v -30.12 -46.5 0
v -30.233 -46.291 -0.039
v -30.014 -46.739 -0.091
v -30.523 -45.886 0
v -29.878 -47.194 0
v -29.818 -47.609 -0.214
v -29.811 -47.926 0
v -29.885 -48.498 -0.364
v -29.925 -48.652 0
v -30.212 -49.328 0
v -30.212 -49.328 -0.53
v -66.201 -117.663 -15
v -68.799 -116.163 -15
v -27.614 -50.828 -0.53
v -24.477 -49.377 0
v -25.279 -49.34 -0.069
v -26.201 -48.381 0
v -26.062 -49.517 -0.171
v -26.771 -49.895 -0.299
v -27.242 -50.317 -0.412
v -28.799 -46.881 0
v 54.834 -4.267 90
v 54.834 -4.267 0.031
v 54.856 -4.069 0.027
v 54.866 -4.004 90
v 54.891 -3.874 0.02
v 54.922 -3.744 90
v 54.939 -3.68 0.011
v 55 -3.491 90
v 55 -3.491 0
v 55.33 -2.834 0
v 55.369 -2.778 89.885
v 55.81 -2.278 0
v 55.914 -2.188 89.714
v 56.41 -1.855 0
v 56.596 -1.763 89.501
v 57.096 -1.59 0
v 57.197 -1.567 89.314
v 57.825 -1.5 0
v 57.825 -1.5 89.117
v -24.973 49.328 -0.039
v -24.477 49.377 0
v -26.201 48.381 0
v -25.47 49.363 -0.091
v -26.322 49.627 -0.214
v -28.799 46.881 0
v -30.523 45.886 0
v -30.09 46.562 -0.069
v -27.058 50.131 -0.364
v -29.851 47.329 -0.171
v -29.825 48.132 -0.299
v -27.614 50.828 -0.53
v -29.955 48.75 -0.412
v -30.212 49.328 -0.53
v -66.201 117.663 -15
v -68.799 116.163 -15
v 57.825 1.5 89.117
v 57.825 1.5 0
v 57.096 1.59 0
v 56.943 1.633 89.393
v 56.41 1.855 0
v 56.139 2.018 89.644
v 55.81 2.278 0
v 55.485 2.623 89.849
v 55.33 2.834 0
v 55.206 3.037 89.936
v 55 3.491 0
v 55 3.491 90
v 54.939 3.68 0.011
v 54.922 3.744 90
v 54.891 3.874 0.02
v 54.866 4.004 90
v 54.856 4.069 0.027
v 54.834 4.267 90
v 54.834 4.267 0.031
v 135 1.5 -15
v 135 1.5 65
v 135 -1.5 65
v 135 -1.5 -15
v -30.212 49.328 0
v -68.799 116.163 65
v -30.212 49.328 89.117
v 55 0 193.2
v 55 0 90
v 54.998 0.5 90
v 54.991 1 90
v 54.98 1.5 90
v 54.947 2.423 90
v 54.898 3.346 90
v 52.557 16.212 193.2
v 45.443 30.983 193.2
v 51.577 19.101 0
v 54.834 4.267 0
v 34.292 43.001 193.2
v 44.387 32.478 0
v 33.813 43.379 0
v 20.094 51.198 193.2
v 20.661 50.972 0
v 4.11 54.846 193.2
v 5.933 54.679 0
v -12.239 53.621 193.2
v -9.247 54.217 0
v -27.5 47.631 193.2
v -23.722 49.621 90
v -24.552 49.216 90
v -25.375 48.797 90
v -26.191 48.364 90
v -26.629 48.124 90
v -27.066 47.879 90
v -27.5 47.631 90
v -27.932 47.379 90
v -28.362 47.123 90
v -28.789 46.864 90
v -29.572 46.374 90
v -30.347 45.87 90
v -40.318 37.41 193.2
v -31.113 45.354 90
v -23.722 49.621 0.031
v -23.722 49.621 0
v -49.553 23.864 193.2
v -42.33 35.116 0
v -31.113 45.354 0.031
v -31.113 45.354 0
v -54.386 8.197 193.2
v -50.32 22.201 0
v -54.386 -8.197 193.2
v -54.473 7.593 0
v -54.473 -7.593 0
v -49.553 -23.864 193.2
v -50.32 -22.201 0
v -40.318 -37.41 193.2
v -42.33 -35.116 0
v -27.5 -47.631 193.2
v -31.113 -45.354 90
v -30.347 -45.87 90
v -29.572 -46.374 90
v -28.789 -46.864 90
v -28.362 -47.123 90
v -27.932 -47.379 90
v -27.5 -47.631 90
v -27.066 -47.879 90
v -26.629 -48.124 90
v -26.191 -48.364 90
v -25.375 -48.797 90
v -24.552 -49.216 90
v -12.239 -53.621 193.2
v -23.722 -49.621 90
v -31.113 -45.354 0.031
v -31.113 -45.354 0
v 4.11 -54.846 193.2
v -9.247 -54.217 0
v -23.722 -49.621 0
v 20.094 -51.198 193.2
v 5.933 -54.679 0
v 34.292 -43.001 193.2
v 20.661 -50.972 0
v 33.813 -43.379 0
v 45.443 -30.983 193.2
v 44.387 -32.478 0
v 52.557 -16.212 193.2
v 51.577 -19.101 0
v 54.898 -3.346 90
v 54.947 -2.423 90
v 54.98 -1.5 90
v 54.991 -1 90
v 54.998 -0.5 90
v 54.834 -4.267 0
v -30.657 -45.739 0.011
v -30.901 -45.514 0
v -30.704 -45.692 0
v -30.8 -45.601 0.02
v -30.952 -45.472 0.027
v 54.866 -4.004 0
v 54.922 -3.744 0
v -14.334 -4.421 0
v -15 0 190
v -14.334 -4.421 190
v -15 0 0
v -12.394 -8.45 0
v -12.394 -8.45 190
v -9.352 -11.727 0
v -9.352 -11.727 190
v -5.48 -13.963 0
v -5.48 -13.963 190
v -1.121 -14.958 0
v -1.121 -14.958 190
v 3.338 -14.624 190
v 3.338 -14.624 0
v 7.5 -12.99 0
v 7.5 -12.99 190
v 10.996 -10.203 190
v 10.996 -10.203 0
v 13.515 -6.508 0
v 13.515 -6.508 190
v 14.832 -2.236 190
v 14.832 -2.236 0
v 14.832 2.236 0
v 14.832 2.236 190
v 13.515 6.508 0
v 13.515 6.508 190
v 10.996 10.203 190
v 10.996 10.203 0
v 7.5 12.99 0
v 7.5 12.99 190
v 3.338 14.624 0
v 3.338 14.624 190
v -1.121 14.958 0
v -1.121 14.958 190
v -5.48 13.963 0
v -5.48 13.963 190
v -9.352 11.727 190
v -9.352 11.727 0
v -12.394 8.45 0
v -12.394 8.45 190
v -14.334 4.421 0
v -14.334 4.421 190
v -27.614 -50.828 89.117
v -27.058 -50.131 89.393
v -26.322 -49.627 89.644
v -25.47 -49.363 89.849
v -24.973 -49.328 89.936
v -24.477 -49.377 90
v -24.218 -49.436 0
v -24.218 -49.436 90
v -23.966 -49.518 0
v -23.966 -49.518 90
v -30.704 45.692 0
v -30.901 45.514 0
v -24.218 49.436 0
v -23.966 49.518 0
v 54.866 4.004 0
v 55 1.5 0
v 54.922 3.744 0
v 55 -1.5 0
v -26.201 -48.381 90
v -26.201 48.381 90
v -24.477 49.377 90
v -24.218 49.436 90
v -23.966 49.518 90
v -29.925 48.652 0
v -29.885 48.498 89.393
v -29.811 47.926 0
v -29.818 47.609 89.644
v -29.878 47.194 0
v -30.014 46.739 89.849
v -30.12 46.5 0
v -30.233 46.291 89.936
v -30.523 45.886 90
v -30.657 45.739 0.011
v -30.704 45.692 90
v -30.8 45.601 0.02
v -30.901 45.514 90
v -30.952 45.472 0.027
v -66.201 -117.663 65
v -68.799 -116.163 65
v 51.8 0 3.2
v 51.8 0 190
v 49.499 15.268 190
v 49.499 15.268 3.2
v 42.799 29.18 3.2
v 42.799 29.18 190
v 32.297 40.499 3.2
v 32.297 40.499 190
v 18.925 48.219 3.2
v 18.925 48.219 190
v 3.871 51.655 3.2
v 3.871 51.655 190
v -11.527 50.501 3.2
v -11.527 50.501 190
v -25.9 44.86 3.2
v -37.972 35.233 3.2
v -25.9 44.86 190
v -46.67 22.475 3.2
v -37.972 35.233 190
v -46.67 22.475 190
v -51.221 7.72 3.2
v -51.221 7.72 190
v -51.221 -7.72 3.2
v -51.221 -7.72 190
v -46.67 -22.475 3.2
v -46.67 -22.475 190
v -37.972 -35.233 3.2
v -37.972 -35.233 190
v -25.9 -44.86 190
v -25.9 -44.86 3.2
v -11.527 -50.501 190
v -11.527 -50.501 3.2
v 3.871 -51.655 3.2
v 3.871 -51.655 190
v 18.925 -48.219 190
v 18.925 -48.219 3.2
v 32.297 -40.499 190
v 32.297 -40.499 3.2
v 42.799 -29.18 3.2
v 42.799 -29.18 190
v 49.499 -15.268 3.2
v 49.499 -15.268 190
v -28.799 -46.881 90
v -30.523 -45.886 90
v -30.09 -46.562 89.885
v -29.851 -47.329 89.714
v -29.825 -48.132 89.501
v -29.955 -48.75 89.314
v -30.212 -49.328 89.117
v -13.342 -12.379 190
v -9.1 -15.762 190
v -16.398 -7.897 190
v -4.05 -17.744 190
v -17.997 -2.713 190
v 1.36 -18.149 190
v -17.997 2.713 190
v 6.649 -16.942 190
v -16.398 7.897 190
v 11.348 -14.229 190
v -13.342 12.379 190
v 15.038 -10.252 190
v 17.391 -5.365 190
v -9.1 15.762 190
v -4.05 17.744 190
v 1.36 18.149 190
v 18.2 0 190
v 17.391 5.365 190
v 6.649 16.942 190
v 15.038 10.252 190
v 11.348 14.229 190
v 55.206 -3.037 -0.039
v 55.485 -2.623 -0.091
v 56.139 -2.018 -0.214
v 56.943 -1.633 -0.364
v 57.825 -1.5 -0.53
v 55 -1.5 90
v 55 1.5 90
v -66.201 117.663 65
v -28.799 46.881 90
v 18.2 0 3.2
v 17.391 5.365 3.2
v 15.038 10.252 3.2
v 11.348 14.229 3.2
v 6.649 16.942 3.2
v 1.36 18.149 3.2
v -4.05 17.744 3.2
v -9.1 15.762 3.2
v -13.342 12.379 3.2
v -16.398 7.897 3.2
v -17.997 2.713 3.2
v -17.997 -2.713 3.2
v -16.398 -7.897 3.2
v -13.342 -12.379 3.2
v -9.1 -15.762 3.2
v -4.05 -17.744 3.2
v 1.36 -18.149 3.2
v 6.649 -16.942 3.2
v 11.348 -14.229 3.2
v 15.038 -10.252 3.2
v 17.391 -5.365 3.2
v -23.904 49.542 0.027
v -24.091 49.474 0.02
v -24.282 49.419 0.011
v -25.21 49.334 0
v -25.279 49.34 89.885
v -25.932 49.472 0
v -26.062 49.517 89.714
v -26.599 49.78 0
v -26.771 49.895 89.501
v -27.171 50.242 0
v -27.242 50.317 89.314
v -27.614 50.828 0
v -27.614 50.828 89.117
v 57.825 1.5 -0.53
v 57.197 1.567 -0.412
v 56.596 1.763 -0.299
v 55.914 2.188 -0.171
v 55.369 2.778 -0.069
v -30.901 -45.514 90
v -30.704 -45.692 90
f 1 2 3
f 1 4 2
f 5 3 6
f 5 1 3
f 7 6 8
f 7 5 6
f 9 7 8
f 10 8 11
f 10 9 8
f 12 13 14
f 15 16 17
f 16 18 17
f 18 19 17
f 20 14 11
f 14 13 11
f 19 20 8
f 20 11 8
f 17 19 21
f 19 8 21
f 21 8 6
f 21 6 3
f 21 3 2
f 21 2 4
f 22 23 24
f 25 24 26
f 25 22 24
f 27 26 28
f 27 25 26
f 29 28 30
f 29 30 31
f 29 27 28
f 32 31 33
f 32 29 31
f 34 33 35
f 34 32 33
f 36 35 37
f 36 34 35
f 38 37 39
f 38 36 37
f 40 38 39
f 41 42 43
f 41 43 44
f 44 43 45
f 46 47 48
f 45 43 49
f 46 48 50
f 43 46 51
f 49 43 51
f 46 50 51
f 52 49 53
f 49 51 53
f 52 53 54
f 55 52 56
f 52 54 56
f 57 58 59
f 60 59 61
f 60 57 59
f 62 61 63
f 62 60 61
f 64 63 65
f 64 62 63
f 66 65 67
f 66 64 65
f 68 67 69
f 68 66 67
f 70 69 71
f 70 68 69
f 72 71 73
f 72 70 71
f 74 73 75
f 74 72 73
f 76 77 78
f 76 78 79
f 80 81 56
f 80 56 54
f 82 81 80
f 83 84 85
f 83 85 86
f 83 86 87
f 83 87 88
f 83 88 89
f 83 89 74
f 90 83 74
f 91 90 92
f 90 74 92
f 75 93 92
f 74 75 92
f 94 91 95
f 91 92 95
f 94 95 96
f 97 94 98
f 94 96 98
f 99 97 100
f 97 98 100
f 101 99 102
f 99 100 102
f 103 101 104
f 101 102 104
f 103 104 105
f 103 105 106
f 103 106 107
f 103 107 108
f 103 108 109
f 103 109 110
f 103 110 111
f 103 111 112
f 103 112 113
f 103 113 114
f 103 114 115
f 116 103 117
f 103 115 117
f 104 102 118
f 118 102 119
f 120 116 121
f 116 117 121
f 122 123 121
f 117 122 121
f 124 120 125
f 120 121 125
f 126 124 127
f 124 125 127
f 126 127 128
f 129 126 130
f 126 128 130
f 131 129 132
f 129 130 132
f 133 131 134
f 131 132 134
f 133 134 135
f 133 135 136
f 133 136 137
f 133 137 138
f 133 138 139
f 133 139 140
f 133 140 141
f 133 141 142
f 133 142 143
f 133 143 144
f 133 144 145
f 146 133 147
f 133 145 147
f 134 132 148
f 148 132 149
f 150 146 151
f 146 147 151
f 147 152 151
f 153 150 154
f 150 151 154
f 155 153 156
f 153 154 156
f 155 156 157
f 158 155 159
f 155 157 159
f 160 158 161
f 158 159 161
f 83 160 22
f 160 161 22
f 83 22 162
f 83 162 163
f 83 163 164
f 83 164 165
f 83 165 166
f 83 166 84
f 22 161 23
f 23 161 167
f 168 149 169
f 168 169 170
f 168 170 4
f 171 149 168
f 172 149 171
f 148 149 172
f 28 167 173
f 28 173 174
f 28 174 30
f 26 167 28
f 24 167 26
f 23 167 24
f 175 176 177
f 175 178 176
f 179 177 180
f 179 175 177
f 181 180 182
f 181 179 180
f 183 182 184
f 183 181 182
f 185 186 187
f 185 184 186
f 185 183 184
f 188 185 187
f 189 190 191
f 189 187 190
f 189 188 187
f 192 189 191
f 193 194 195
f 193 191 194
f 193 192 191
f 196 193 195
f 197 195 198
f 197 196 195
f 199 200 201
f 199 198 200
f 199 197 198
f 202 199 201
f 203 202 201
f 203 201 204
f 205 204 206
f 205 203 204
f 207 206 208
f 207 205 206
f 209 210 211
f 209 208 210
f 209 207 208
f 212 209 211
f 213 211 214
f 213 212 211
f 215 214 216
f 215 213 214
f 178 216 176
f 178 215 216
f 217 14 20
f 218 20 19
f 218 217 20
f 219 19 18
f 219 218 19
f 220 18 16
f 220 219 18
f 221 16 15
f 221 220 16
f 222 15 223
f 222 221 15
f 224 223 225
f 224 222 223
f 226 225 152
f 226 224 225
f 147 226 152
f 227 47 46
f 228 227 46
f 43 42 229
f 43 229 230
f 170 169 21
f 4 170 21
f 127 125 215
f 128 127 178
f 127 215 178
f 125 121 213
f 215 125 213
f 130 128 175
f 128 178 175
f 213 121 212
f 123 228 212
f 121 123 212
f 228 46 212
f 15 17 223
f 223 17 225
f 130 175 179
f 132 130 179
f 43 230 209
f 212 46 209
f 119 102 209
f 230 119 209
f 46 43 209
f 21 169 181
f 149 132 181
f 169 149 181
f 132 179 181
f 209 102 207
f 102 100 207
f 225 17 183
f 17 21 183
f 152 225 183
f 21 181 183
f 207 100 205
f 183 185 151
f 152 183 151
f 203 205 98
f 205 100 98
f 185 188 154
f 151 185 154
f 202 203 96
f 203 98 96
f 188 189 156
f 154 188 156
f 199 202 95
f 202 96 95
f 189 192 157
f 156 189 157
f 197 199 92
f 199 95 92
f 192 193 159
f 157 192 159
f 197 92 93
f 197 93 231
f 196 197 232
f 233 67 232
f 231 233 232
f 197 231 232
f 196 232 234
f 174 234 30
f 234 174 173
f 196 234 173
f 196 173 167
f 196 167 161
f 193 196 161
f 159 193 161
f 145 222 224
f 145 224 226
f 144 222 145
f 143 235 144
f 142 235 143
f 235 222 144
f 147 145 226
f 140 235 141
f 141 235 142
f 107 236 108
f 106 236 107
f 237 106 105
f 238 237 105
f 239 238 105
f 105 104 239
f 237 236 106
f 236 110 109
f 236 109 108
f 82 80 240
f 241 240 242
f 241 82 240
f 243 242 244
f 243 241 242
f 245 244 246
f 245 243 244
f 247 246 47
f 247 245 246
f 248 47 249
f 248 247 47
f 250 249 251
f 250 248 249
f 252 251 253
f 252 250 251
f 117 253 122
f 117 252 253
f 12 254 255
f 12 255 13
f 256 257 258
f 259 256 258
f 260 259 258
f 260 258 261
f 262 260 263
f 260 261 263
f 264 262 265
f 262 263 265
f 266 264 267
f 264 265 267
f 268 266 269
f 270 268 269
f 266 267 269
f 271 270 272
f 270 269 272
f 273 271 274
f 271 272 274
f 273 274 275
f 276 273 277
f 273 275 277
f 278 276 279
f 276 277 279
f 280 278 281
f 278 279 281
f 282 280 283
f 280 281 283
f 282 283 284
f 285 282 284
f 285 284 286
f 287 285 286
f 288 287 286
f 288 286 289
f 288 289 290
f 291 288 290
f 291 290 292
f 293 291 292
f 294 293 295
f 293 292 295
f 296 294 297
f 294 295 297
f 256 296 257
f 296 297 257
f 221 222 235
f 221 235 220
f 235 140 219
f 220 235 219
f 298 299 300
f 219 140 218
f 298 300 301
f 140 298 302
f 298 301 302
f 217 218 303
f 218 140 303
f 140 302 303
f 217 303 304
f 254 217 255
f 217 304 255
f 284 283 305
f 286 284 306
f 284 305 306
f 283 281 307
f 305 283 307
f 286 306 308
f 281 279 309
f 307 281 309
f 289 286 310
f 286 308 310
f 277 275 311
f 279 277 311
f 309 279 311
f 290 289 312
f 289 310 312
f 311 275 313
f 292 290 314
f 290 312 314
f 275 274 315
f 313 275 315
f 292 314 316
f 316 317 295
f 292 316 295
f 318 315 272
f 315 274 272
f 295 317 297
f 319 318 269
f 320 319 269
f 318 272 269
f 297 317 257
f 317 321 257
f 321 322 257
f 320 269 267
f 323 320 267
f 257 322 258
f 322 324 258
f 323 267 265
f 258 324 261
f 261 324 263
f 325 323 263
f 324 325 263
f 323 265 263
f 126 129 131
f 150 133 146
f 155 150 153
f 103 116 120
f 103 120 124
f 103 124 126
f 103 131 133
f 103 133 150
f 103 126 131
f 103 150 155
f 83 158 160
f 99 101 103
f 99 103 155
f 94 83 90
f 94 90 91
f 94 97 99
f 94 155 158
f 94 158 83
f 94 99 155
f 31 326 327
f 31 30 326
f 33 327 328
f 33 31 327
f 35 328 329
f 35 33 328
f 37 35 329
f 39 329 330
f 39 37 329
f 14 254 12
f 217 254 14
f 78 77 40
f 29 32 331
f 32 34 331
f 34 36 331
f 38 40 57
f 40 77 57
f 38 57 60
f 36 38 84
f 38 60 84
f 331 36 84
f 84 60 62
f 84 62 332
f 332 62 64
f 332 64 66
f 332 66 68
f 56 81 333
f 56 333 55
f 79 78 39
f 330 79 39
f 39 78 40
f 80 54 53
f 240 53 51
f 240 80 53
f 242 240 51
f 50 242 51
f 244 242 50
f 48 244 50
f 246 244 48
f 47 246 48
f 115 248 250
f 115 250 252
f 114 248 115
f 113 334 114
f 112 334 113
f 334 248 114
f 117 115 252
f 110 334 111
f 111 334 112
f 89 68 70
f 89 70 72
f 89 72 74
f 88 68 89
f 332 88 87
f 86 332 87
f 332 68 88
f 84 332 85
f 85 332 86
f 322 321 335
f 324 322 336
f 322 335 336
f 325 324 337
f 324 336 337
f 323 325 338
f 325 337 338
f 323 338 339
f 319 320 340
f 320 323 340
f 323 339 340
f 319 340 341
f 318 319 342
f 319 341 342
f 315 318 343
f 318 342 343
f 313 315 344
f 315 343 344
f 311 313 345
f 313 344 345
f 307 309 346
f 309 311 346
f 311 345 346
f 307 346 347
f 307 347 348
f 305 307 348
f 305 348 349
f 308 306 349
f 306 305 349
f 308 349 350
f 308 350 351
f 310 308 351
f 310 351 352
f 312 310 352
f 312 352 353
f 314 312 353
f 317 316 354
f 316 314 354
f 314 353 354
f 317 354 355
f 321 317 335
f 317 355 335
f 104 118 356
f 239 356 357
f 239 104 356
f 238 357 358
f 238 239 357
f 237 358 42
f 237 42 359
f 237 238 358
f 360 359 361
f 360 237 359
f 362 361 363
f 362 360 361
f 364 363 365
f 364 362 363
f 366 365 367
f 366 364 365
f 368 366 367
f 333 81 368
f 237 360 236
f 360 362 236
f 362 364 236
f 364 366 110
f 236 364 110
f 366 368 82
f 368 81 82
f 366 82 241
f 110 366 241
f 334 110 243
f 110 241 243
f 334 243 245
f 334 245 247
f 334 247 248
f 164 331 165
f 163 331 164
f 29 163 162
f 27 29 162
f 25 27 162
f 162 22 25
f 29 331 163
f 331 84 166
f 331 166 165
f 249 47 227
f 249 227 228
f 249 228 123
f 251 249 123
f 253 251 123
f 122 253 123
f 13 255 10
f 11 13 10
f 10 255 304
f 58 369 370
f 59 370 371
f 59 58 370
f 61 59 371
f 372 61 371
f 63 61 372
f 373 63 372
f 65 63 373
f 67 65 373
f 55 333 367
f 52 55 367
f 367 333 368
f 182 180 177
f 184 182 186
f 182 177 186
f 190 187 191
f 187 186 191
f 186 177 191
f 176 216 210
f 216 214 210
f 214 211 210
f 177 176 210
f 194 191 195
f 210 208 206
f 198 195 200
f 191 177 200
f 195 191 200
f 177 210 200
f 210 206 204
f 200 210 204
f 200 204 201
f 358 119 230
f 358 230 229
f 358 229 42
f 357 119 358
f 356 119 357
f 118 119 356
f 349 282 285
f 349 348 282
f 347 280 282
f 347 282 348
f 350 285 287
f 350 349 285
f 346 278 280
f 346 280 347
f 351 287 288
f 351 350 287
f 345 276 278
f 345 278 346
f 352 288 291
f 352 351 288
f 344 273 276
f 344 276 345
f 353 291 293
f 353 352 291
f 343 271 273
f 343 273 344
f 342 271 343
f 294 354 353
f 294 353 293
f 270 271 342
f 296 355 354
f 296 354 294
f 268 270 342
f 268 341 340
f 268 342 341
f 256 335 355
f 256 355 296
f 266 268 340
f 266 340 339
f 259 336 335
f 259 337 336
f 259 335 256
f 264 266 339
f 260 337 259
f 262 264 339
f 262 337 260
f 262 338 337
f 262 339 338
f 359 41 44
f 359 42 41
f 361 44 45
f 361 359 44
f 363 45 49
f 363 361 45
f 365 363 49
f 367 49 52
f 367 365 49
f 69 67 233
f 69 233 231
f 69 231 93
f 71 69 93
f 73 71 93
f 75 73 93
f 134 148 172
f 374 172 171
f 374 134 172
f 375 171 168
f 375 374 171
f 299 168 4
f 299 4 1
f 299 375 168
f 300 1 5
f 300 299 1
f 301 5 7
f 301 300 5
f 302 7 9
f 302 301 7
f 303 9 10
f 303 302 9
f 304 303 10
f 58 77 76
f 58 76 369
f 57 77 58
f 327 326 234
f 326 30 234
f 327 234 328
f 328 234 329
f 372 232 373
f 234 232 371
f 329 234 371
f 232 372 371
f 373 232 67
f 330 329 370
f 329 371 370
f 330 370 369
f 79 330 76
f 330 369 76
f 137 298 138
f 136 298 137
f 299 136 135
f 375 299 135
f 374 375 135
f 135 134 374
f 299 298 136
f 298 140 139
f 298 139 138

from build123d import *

# Parameters (mm, degrees)
SKETCH_1_R               = 55
EXTRUDE_1_DEPTH          = 190
SKETCH_2_R               = 51.8
CUT_EXTRUDE_1_DEPTH      = 186.8
SKETCH_3_R               = 15
CUT_EXTRUDE_2_DEPTH      = 10
SKETCH_4_R               = 18.2
SKETCH_4_R_2             = 15
EXTRUDE_2_DEPTH          = 188
SKETCH_5_R               = 55
EXTRUDE_5_DEPTH          = 3.2
EXTRUDE_6_DEPTH          = 1.5
PATTERN_CIRCULAR_1_COUNT = 3
FILLET_1_R               = 3


with BuildPart() as part:
    # 草图1 → 凸台-拉伸1 (new body)
    with BuildSketch(Plane.XY):
        Circle(SKETCH_1_R)
    extrude(amount=EXTRUDE_1_DEPTH)

    # 草图2 → 切除-拉伸1 (cut)
    with BuildSketch(Plane.XY.offset(190)):
        Circle(SKETCH_2_R)
    extrude(amount=-CUT_EXTRUDE_1_DEPTH, mode=Mode.SUBTRACT)

    # 草图3 → 切除-拉伸2 (cut)
    with BuildSketch(Plane(origin=(0, 0, 0), x_dir=(-1, 0, 0), z_dir=(0, 0, -1))):
        Circle(SKETCH_3_R)
    extrude(amount=-CUT_EXTRUDE_2_DEPTH, mode=Mode.SUBTRACT)

    # 草图4 → 凸台-拉伸2 (add)
    with BuildSketch(Plane.XY.offset(3.2)):
        Circle(SKETCH_4_R)
        with Locations(Location((0, 0, 0), (0, 0, 180))):
            Circle(SKETCH_4_R_2, mode=Mode.SUBTRACT)
    extrude(amount=EXTRUDE_2_DEPTH)

    # 草图5 → 凸台-拉伸5 (add)
    with BuildSketch(Plane.XY.offset(190)):
        Circle(SKETCH_5_R)
    extrude(amount=EXTRUDE_5_DEPTH)

    # 草图8 → 凸台-拉伸6 (add, symmetric)
    with BuildSketch(Plane(origin=(0, 0, 0), x_dir=(-1, 0, 0), z_dir=(0, 1, 0))):
        Polygon((-55, 90), (-135, 65), (-135, -15), (-55, 0), (-53, 0), (-53, 90), align=None)
    extrude_6 = extrude(amount=EXTRUDE_6_DEPTH, both=True)

    # 阵列(圆周)1: 凸台-拉伸6 ×3 about axis
    pattern_circular_1_axis = Axis((0, 0, 0), (0, 0, 1))
    for i in range(1, PATTERN_CIRCULAR_1_COUNT):
        add(extrude_6.rotate(pattern_circular_1_axis, i * 360 / PATTERN_CIRCULAR_1_COUNT))

    # 圆角1
    # the kernel refuses this fillet: 3 mm, written as the material it adds along each edge
    with BuildSketch(Plane(origin=(-28.78880893, -46.863679757, 90), x_dir=(-0.5000000000000001, -0.8660254037844386, 0), z_dir=(0, 0, -1))) as fillet_1_piece_1_section:
        with BuildLine():
            CenterArc((2.845625882, 3), FILLET_1_R, 184.449834226, 85.550165774)
            ThreePointArc((-0.14533106, 2.767241379), (-0.055235086, 1.384536108), (0, 0))
            Line((0, 0), (2.845625882, 0))
        make_face()
    fillet_1_piece_1 = extrude(amount=90, mode=Mode.PRIVATE)
    fillet_1_piece_1 = split(fillet_1_piece_1, bisect_by=Plane(origin=(-36.031072916, -58.160902251, 85.817388964), z_dir=(0.14913749656797354, 0.25831372136935893, -0.9544799780350298)), keep=Keep.TOP, mode=Mode.PRIVATE)
    fillet_1_piece_1 = split(fillet_1_piece_1, bisect_by=Plane(origin=(-25.561501862, -40.027073251, 1.416522524), z_dir=(-0.09214426752509275, -0.15959855297967937, 0.982872186934322)), keep=Keep.TOP, mode=Mode.PRIVATE)
    add(fillet_1_piece_1)
    with BuildSketch(Plane(origin=(-28.78880893, -46.863679757, 90), x_dir=(-0.5000000000000001, -0.8660254037844386, 0), z_dir=(0, 0, -1))) as fillet_1_piece_2_section:
        with BuildLine():
            CenterArc((2.845625882, 3), FILLET_1_R, 184.449834226, 85.550165774)
            ThreePointArc((-0.14533106, 2.767241379), (-0.055235086, 1.384536108), (0, 0))
            Line((0, 0), (2.845625882, 0))
        make_face()
    fillet_1_piece_2 = extrude(amount=90, mode=Mode.PRIVATE)
    fillet_1_piece_2 = split(fillet_1_piece_2, bisect_by=Plane(origin=(-30.206894917, -45.938881036, 0.021058977), z_dir=(0.09214426752509275, 0.15959855297967937, -0.982872186934322)), keep=Keep.TOP, mode=Mode.PRIVATE)
    add(fillet_1_piece_2)
    with BuildSketch(Plane(origin=(-28.78880893, -46.863679757, 90), x_dir=(-0.5000000000000001, -0.8660254037844386, 0), z_dir=(0, 0, -1))) as fillet_1_piece_3_section:
        with BuildLine():
            CenterArc((2.845625882, 3), FILLET_1_R, 184.449834226, 85.550165774)
            ThreePointArc((-0.14533106, 2.767241379), (-0.055235086, 1.384536108), (0, 0))
            Line((0, 0), (2.845625882, 0))
        make_face()
    fillet_1_piece_3 = extrude(amount=97.114064704, mode=Mode.PRIVATE)
    fillet_1_piece_3 = split(fillet_1_piece_3, bisect_by=Plane(origin=(-29.644971354, -47.826469744, 0), z_dir=(0, 0, -1)), keep=Keep.TOP, mode=Mode.PRIVATE)
    fillet_1_piece_3 = split(fillet_1_piece_3, bisect_by=Plane(origin=(-29.634430967, -47.808213257, -0.228814251), z_dir=(-0.09214426752509275, -0.15959855297967937, 0.982872186934322)), keep=Keep.TOP, mode=Mode.PRIVATE)
    add(fillet_1_piece_3)
    with BuildSketch(Plane(origin=(-26.190732719, -48.363679757, 90), x_dir=(-0.5000000000000023, -0.8660254037844373, 0), z_dir=(0, 0, -1))) as fillet_1_piece_4_section:
        with BuildLine():
            CenterArc((2.845625882, -3), FILLET_1_R, 90, 85.550165774)
            ThreePointArc((-0.14533106, -2.767241379), (-0.055235086, -1.384536108), (0, 0))
            Line((0, 0), (2.845625882, 0))
        make_face()
    fillet_1_piece_4 = extrude(amount=90, mode=Mode.PRIVATE)
    fillet_1_piece_4 = split(fillet_1_piece_4, bisect_by=Plane(origin=(-21.883711344, -42.150446597, 1.416522524), z_dir=(-0.09214426752509275, -0.15959855297967937, 0.982872186934322)), keep=Keep.TOP, mode=Mode.PRIVATE)
    fillet_1_piece_4 = split(fillet_1_piece_4, bisect_by=Plane(origin=(-32.353282398, -60.284275597, 85.817388964), z_dir=(0.14913749656797354, 0.25831372136935893, -0.9544799780350298)), keep=Keep.TOP, mode=Mode.PRIVATE)
    add(fillet_1_piece_4)
    with BuildSketch(Plane(origin=(-26.190732719, -48.363679757, 90), x_dir=(-0.5000000000000023, -0.8660254037844373, 0), z_dir=(0, 0, -1))) as fillet_1_piece_5_section:
        with BuildLine():
            CenterArc((2.845625882, -3), FILLET_1_R, 90, 85.550165774)
            ThreePointArc((-0.14533106, -2.767241379), (-0.055235086, -1.384536108), (0, 0))
            Line((0, 0), (2.845625882, 0))
        make_face()
    fillet_1_piece_5 = extrude(amount=90, mode=Mode.PRIVATE)
    fillet_1_piece_5 = split(fillet_1_piece_5, bisect_by=Plane(origin=(-24.68079054, -49.129378886, 0.021058977), z_dir=(0.09214426752509275, 0.15959855297967937, -0.982872186934322)), keep=Keep.TOP, mode=Mode.PRIVATE)
    add(fillet_1_piece_5)
    with BuildSketch(Plane(origin=(-26.190732719, -48.363679757, 90), x_dir=(-0.5000000000000023, -0.8660254037844373, 0), z_dir=(0, 0, -1))) as fillet_1_piece_6_section:
        with BuildLine():
            CenterArc((2.845625882, -3), FILLET_1_R, 90, 85.550165774)
            ThreePointArc((-0.14533106, -2.767241379), (-0.055235086, -1.384536108), (0, 0))
            Line((0, 0), (2.845625882, 0))
        make_face()
    fillet_1_piece_6 = extrude(amount=97.114064704, mode=Mode.PRIVATE)
    fillet_1_piece_6 = split(fillet_1_piece_6, bisect_by=Plane(origin=(-26.596452095, -49.58653316, 0), z_dir=(0, 0, -1)), keep=Keep.TOP, mode=Mode.PRIVATE)
    fillet_1_piece_6 = split(fillet_1_piece_6, bisect_by=Plane(origin=(-26.585911707, -49.568276672, -0.228814251), z_dir=(-0.09214426752509275, -0.15959855297967937, 0.982872186934322)), keep=Keep.TOP, mode=Mode.PRIVATE)
    add(fillet_1_piece_6)
    with BuildSketch(Plane(origin=(54.97954165, -1.5, 90), x_dir=(1, 0, 0), z_dir=(0, 0, -1))) as fillet_1_piece_7_section:
        with BuildLine():
            CenterArc((2.845625882, 3), FILLET_1_R, 184.449834226, 85.550165774)
            ThreePointArc((-0.14533106, 2.767241379), (-0.055235086, 1.384536108), (0, 0))
            Line((0, 0), (2.845625882, 0))
        make_face()
    fillet_1_piece_7 = extrude(amount=90, mode=Mode.PRIVATE)
    fillet_1_piece_7 = split(fillet_1_piece_7, bisect_by=Plane(origin=(47.445213206, -2.123373346, 1.416522524), z_dir=(0.1842885350501853, 0, 0.9828721869343219)), keep=Keep.TOP, mode=Mode.PRIVATE)
    fillet_1_piece_7 = split(fillet_1_piece_7, bisect_by=Plane(origin=(68.384355315, -2.123373346, 85.817388964), z_dir=(-0.2982749931359468, 0, -0.9544799780350298)), keep=Keep.TOP, mode=Mode.PRIVATE)
    add(fillet_1_piece_7)
    with BuildSketch(Plane(origin=(54.97954165, -1.5, 90), x_dir=(1, 0, 0), z_dir=(0, 0, -1))) as fillet_1_piece_8_section:
        with BuildLine():
            CenterArc((2.845625882, 3), FILLET_1_R, 184.449834226, 85.550165774)
            ThreePointArc((-0.14533106, 2.767241379), (-0.055235086, 1.384536108), (0, 0))
            Line((0, 0), (2.845625882, 0))
        make_face()
    fillet_1_piece_8 = extrude(amount=90, mode=Mode.PRIVATE)
    fillet_1_piece_8 = split(fillet_1_piece_8, bisect_by=Plane(origin=(54.887685457, -3.19049785, 0.021058977), z_dir=(-0.1842885350501853, 0, -0.9828721869343219)), keep=Keep.TOP, mode=Mode.PRIVATE)
    add(fillet_1_piece_8)
    with BuildSketch(Plane(origin=(54.97954165, -1.5, 90), x_dir=(1, 0, 0), z_dir=(0, 0, -1))) as fillet_1_piece_9_section:
        with BuildLine():
            CenterArc((2.845625882, 3), FILLET_1_R, 184.449834226, 85.550165774)
            ThreePointArc((-0.14533106, 2.767241379), (-0.055235086, 1.384536108), (0, 0))
            Line((0, 0), (2.845625882, 0))
        make_face()
    fillet_1_piece_9 = extrude(amount=97.114064704, mode=Mode.PRIVATE)
    fillet_1_piece_9 = split(fillet_1_piece_9, bisect_by=Plane(origin=(56.241423449, -1.760063415, 0), z_dir=(0, 0, -1)), keep=Keep.TOP, mode=Mode.PRIVATE)
    fillet_1_piece_9 = split(fillet_1_piece_9, bisect_by=Plane(origin=(56.220342674, -1.760063415, -0.228814251), z_dir=(0.1842885350501853, 0, 0.9828721869343219)), keep=Keep.TOP, mode=Mode.PRIVATE)
    add(fillet_1_piece_9)
    with BuildSketch(Plane(origin=(54.97954165, 1.5, 90), x_dir=(-0.052446111063003654, 0.9986237556929872, 0), z_dir=(0, 0, -1))) as fillet_1_piece_10_section:
        with BuildLine():
            CenterArc((2.846629256, 2.999047938), FILLET_1_R, 183.006320086, 85.550165774)
            Line((-0.149242011, 2.841709605), (0, 0))
            ThreePointArc((0, 0), (1.385527514, 0.017454465), (2.771055028, 0))
        make_face()
    fillet_1_piece_10 = extrude(amount=90, mode=Mode.PRIVATE)
    fillet_1_piece_10 = split(fillet_1_piece_10, bisect_by=Plane(origin=(68.384355315, 2.123373346, 85.817388964), z_dir=(-0.2982749931359468, 0, -0.9544799780350298)), keep=Keep.TOP, mode=Mode.PRIVATE)
    fillet_1_piece_10 = split(fillet_1_piece_10, bisect_by=Plane(origin=(47.445213206, 2.123373346, 1.416522524), z_dir=(0.1842885350501853, 0, 0.9828721869343219)), keep=Keep.TOP, mode=Mode.PRIVATE)
    add(fillet_1_piece_10)
    with BuildSketch(Plane(origin=(54.97954165, 1.5, 90), x_dir=(-0.052446111063003654, 0.9986237556929872, 0), z_dir=(0, 0, -1))) as fillet_1_piece_11_section:
        with BuildLine():
            CenterArc((2.846629256, 2.999047938), FILLET_1_R, 183.006320086, 85.550165774)
            Line((-0.149242011, 2.841709605), (0, 0))
            ThreePointArc((0, 0), (1.385527514, 0.017454465), (2.771055028, 0))
        make_face()
    fillet_1_piece_11 = extrude(amount=97.114064704, mode=Mode.PRIVATE)
    fillet_1_piece_11 = split(fillet_1_piece_11, bisect_by=Plane(origin=(56.241423446, 1.760063423, 0), z_dir=(0, 0, -1)), keep=Keep.TOP, mode=Mode.PRIVATE)
    fillet_1_piece_11 = split(fillet_1_piece_11, bisect_by=Plane(origin=(56.220342671, 1.760063423, -0.228814251), z_dir=(0.1842885350501853, 0, 0.9828721869343219)), keep=Keep.TOP, mode=Mode.PRIVATE)
    add(fillet_1_piece_11)
    with BuildSketch(Plane(origin=(54.97954165, 1.5, 90), x_dir=(-0.052446111063003654, 0.9986237556929872, 0), z_dir=(0, 0, -1))) as fillet_1_piece_12_section:
        with BuildLine():
            CenterArc((2.846629256, 2.999047938), FILLET_1_R, 183.006320086, 85.550165774)
            Line((-0.149242011, 2.841709605), (0, 0))
            ThreePointArc((0, 0), (1.385527514, 0.017454465), (2.771055028, 0))
        make_face()
    fillet_1_piece_12 = extrude(amount=90, mode=Mode.PRIVATE)
    fillet_1_piece_12 = split(fillet_1_piece_12, bisect_by=Plane(origin=(54.887685455, 3.190497829, 0.021058977), z_dir=(-0.1842885350501853, 0, -0.9828721869343219)), keep=Keep.TOP, mode=Mode.PRIVATE)
    add(fillet_1_piece_12)
    with BuildSketch(Plane(origin=(-26.190732719, 48.363679757, 90), x_dir=(-0.5000000000000009, 0.866025403784438, 0), z_dir=(0, 0, -1))) as fillet_1_piece_13_section:
        with BuildLine():
            CenterArc((2.845625882, 3), FILLET_1_R, 184.449834226, 85.550165774)
            ThreePointArc((-0.14533106, 2.767241379), (-0.055235086, 1.384536108), (0, 0))
            Line((0, 0), (2.845625882, 0))
        make_face()
    fillet_1_piece_13 = extrude(amount=90, mode=Mode.PRIVATE)
    fillet_1_piece_13 = split(fillet_1_piece_13, bisect_by=Plane(origin=(-32.353282398, 60.284275597, 85.817388964), z_dir=(0.14913749656797334, -0.25831372136935904, -0.9544799780350298)), keep=Keep.TOP, mode=Mode.PRIVATE)
    fillet_1_piece_13 = split(fillet_1_piece_13, bisect_by=Plane(origin=(-21.883711344, 42.150446597, 1.416522524), z_dir=(-0.09214426752509264, 0.15959855297967945, 0.982872186934322)), keep=Keep.TOP, mode=Mode.PRIVATE)
    add(fillet_1_piece_13)
    with BuildSketch(Plane(origin=(-26.190732719, 48.363679757, 90), x_dir=(-0.5000000000000009, 0.866025403784438, 0), z_dir=(0, 0, -1))) as fillet_1_piece_14_section:
        with BuildLine():
            CenterArc((2.845625882, 3), FILLET_1_R, 184.449834226, 85.550165774)
            ThreePointArc((-0.14533106, 2.767241379), (-0.055235086, 1.384536108), (0, 0))
            Line((0, 0), (2.845625882, 0))
        make_face()
    fillet_1_piece_14 = extrude(amount=90, mode=Mode.PRIVATE)
    fillet_1_piece_14 = split(fillet_1_piece_14, bisect_by=Plane(origin=(-24.68079054, 49.129378886, 0.021058977), z_dir=(0.09214426752509264, -0.15959855297967945, -0.982872186934322)), keep=Keep.TOP, mode=Mode.PRIVATE)
    add(fillet_1_piece_14)
    with BuildSketch(Plane(origin=(-26.190732719, 48.363679757, 90), x_dir=(-0.5000000000000009, 0.866025403784438, 0), z_dir=(0, 0, -1))) as fillet_1_piece_15_section:
        with BuildLine():
            CenterArc((2.845625882, 3), FILLET_1_R, 184.449834226, 85.550165774)
            ThreePointArc((-0.14533106, 2.767241379), (-0.055235086, 1.384536108), (0, 0))
            Line((0, 0), (2.845625882, 0))
        make_face()
    fillet_1_piece_15 = extrude(amount=97.114064704, mode=Mode.PRIVATE)
    fillet_1_piece_15 = split(fillet_1_piece_15, bisect_by=Plane(origin=(-26.596452095, 49.58653316, 0), z_dir=(0, 0, -1)), keep=Keep.TOP, mode=Mode.PRIVATE)
    fillet_1_piece_15 = split(fillet_1_piece_15, bisect_by=Plane(origin=(-26.585911707, 49.568276672, -0.228814251), z_dir=(-0.09214426752509264, 0.15959855297967945, 0.982872186934322)), keep=Keep.TOP, mode=Mode.PRIVATE)
    add(fillet_1_piece_15)
    with BuildSketch(Plane(origin=(-28.78880893, 46.863679757, 90), x_dir=(-0.5000000000000001, 0.8660254037844386, 0), z_dir=(0, 0, -1))) as fillet_1_piece_16_section:
        with BuildLine():
            CenterArc((2.845625882, -3), FILLET_1_R, 90, 85.550165774)
            ThreePointArc((-0.14533106, -2.767241379), (-0.055235086, -1.384536108), (0, 0))
            Line((0, 0), (2.845625882, 0))
        make_face()
    fillet_1_piece_16 = extrude(amount=90, mode=Mode.PRIVATE)
    fillet_1_piece_16 = split(fillet_1_piece_16, bisect_by=Plane(origin=(-25.561501862, 40.027073251, 1.416522524), z_dir=(-0.09214426752509264, 0.15959855297967945, 0.982872186934322)), keep=Keep.TOP, mode=Mode.PRIVATE)
    fillet_1_piece_16 = split(fillet_1_piece_16, bisect_by=Plane(origin=(-36.031072916, 58.160902251, 85.817388964), z_dir=(0.14913749656797334, -0.25831372136935904, -0.9544799780350298)), keep=Keep.TOP, mode=Mode.PRIVATE)
    add(fillet_1_piece_16)
    with BuildSketch(Plane(origin=(-28.78880893, 46.863679757, 90), x_dir=(-0.5000000000000001, 0.8660254037844386, 0), z_dir=(0, 0, -1))) as fillet_1_piece_17_section:
        with BuildLine():
            CenterArc((2.845625882, -3), FILLET_1_R, 90, 85.550165774)
            ThreePointArc((-0.14533106, -2.767241379), (-0.055235086, -1.384536108), (0, 0))
            Line((0, 0), (2.845625882, 0))
        make_face()
    fillet_1_piece_17 = extrude(amount=90, mode=Mode.PRIVATE)
    fillet_1_piece_17 = split(fillet_1_piece_17, bisect_by=Plane(origin=(-30.206894917, 45.938881036, 0.021058977), z_dir=(0.09214426752509264, -0.15959855297967945, -0.982872186934322)), keep=Keep.TOP, mode=Mode.PRIVATE)
    add(fillet_1_piece_17)
    with BuildSketch(Plane(origin=(-28.78880893, 46.863679757, 90), x_dir=(-0.5000000000000001, 0.8660254037844386, 0), z_dir=(0, 0, -1))) as fillet_1_piece_18_section:
        with BuildLine():
            CenterArc((2.845625882, -3), FILLET_1_R, 90, 85.550165774)
            ThreePointArc((-0.14533106, -2.767241379), (-0.055235086, -1.384536108), (0, 0))
            Line((0, 0), (2.845625882, 0))
        make_face()
    fillet_1_piece_18 = extrude(amount=97.114064704, mode=Mode.PRIVATE)
    fillet_1_piece_18 = split(fillet_1_piece_18, bisect_by=Plane(origin=(-29.644971354, 47.826469744, 0), z_dir=(0, 0, -1)), keep=Keep.TOP, mode=Mode.PRIVATE)
    fillet_1_piece_18 = split(fillet_1_piece_18, bisect_by=Plane(origin=(-29.634430967, 47.808213257, -0.228814251), z_dir=(-0.09214426752509264, 0.15959855297967945, 0.982872186934322)), keep=Keep.TOP, mode=Mode.PRIVATE)
    add(fillet_1_piece_18)


solid = part.part
